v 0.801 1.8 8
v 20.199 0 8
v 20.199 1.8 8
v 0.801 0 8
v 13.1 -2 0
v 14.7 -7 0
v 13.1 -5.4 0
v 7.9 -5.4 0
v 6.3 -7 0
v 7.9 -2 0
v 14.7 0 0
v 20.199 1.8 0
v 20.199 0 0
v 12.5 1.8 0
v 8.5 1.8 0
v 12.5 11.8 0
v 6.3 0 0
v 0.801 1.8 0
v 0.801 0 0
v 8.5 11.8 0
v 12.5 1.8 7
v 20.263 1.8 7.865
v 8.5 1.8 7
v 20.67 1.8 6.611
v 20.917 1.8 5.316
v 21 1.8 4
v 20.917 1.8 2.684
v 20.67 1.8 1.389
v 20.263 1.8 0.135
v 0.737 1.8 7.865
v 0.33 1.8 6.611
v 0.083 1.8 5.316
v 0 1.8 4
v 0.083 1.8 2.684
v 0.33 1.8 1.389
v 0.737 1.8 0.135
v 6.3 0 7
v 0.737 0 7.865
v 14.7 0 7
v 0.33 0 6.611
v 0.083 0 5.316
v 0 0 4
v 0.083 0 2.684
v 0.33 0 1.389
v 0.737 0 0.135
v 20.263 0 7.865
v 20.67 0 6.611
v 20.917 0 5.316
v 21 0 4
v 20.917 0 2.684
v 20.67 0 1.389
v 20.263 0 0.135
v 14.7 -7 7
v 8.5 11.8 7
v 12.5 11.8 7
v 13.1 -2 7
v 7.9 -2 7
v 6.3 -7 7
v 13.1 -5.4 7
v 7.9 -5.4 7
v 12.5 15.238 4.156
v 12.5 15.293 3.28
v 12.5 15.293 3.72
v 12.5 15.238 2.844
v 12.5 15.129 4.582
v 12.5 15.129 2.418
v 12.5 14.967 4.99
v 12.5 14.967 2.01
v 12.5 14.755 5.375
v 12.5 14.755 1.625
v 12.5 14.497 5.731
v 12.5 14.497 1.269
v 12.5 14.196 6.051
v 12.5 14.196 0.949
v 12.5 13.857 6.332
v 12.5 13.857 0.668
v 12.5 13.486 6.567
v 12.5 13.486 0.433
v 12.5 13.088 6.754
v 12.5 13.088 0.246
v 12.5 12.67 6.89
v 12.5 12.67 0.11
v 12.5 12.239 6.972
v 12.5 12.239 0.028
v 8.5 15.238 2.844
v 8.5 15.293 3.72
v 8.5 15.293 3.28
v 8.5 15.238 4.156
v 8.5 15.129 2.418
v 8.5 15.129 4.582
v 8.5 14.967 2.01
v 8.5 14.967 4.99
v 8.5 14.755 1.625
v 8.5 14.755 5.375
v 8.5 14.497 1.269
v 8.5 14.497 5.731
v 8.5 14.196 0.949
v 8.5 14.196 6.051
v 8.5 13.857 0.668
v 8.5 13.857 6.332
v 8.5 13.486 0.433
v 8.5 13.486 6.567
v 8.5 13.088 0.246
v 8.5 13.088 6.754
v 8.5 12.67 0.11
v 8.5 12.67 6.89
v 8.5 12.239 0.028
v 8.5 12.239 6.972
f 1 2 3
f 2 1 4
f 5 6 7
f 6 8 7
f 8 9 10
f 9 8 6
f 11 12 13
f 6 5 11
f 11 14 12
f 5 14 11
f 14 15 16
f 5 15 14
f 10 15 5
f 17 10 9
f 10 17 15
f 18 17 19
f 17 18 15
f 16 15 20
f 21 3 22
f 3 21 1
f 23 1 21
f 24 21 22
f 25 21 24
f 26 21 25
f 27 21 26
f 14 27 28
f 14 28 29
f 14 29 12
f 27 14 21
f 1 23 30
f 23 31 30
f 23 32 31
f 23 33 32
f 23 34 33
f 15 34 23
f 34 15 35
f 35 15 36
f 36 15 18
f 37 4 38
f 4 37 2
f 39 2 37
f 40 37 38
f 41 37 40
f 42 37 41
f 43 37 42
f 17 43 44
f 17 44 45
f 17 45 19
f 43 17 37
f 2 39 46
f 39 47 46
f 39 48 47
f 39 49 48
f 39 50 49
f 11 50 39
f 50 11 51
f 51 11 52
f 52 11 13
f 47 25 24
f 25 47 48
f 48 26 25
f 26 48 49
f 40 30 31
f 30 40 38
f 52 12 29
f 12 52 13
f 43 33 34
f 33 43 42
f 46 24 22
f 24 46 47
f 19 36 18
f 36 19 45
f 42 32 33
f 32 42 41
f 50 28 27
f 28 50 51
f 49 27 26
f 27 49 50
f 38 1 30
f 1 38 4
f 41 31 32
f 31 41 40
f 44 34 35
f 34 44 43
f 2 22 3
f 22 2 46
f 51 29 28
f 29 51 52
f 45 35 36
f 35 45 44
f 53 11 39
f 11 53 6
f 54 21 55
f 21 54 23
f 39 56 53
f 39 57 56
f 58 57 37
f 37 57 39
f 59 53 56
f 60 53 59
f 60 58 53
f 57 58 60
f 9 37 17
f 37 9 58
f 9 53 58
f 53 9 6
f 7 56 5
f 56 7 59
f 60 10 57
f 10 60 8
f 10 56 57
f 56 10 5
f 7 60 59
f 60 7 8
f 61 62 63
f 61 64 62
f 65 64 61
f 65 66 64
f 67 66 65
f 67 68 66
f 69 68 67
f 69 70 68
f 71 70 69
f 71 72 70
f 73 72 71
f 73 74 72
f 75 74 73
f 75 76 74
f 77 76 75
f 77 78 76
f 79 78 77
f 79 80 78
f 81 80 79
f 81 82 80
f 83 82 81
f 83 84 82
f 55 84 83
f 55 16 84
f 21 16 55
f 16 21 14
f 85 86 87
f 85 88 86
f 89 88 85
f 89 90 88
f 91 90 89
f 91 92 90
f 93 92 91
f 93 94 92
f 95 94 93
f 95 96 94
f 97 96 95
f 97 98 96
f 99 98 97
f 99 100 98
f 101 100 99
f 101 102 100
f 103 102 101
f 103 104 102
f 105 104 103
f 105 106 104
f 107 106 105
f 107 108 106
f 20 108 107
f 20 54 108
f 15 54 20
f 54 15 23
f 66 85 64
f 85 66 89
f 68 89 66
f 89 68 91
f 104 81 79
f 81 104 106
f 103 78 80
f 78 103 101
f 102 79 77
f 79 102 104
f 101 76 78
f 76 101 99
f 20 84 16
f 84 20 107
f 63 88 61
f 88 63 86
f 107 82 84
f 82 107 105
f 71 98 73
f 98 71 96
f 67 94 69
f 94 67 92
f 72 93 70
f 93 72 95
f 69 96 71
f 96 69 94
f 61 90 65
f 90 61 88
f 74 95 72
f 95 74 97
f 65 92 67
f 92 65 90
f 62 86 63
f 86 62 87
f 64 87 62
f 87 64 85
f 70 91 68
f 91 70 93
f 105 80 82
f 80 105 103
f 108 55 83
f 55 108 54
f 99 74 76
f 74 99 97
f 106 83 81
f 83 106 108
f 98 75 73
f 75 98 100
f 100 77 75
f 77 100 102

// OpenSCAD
x = 21;
y = 1.8;
z = 8;
$fn=50;

intersection(){
cube([x,y,z]);
translate([x/2,y,z/2]) rotate([90,0,0]) cylinder(d=x,h=y);
}


x1 = 4;
y1 = y+10;
z1 = 7;
translate([(x-x1)/2,0,0]) cube([x1,y1,z1]);

//tip
translate([(x-x1)/2,y1,z1/2]) rotate([0,90,0]) cylinder(d=z1,h=x1);


//back
difference(){

x2 = 5.2;
y2 = 5.4-2;
z2 = z1;

x3 = x2+2*1.6;
y3 = y2+1.6 + 2;
z3 = z1;

translate([(x-x3)/2,-y3,0]) cube([x3,y3,z3]);

translate([(x-x2)/2,-y2-2,0]) cube([x2,y2,z2]);

}
